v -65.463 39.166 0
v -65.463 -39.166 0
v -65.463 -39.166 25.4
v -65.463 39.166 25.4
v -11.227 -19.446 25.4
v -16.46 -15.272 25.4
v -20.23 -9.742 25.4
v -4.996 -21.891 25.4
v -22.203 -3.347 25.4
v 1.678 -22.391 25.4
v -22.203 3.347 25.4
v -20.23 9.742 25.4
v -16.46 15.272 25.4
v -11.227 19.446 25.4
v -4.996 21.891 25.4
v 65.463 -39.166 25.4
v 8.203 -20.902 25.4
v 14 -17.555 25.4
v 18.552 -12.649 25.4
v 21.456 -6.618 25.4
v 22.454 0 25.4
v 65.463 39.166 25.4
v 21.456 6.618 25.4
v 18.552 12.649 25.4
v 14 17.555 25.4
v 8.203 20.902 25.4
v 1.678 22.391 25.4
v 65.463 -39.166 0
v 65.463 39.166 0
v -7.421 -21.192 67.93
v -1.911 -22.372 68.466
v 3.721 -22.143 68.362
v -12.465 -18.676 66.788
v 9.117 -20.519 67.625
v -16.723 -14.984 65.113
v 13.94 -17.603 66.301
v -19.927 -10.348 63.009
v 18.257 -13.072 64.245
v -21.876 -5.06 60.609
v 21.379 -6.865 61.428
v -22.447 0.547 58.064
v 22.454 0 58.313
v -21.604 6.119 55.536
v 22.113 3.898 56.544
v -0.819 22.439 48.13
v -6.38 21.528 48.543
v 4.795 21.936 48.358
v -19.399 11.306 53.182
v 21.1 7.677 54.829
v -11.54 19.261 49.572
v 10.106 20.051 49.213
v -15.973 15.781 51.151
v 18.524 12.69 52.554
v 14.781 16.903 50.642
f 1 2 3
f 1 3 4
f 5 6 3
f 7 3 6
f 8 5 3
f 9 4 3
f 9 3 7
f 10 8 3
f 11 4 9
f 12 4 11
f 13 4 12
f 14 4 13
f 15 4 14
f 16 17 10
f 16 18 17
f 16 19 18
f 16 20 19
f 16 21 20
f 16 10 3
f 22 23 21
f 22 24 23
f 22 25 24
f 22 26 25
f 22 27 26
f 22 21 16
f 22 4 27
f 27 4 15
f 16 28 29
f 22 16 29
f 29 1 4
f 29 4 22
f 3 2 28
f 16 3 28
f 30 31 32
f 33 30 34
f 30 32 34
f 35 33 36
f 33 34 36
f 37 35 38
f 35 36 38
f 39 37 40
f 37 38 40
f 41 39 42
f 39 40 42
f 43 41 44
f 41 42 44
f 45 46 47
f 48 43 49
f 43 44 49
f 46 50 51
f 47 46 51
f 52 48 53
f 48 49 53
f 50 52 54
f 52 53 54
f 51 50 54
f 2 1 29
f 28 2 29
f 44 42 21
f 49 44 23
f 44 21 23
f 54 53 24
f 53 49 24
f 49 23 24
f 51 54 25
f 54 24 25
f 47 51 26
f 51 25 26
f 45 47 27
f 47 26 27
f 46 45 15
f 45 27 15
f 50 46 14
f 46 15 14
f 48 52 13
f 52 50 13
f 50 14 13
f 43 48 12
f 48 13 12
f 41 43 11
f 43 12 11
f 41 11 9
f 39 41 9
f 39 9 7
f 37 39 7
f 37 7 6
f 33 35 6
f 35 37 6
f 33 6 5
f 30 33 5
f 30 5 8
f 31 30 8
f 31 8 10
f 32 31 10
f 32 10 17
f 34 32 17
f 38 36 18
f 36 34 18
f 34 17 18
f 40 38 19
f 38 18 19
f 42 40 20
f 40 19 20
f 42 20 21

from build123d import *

# Parameters (mm, degrees)
F0_W     = 130.9254616499
F0_H     = 78.3314704895
F1_DEPTH = 25.4
F2_R     = 22.4537347063
F3_DEPTH = 45.466
F5_DEPTH = 38.1


with BuildPart() as f1:
    # F0 (on Top) → F1 (new body)
    with BuildSketch(Plane.XY):
        Rectangle(F0_W, F0_H)
    extrude(amount=F1_DEPTH)

    # F2 (on face) → F3 (join)
    with BuildSketch(Plane.XY.offset(25.4)):
        Circle(F2_R)
    extrude(amount=F3_DEPTH)

    # F4 (on Right) → F5 (cut, symmetric)
    with BuildSketch(Plane.YZ):
        Polygon((39.7252477705, 72.1768513322), (-29.9338120967, 71.8970969319), (39.7252477705, 40.2847565711), align=None)
    extrude(amount=F5_DEPTH, both=True, mode=Mode.SUBTRACT)


solid = f1.part
